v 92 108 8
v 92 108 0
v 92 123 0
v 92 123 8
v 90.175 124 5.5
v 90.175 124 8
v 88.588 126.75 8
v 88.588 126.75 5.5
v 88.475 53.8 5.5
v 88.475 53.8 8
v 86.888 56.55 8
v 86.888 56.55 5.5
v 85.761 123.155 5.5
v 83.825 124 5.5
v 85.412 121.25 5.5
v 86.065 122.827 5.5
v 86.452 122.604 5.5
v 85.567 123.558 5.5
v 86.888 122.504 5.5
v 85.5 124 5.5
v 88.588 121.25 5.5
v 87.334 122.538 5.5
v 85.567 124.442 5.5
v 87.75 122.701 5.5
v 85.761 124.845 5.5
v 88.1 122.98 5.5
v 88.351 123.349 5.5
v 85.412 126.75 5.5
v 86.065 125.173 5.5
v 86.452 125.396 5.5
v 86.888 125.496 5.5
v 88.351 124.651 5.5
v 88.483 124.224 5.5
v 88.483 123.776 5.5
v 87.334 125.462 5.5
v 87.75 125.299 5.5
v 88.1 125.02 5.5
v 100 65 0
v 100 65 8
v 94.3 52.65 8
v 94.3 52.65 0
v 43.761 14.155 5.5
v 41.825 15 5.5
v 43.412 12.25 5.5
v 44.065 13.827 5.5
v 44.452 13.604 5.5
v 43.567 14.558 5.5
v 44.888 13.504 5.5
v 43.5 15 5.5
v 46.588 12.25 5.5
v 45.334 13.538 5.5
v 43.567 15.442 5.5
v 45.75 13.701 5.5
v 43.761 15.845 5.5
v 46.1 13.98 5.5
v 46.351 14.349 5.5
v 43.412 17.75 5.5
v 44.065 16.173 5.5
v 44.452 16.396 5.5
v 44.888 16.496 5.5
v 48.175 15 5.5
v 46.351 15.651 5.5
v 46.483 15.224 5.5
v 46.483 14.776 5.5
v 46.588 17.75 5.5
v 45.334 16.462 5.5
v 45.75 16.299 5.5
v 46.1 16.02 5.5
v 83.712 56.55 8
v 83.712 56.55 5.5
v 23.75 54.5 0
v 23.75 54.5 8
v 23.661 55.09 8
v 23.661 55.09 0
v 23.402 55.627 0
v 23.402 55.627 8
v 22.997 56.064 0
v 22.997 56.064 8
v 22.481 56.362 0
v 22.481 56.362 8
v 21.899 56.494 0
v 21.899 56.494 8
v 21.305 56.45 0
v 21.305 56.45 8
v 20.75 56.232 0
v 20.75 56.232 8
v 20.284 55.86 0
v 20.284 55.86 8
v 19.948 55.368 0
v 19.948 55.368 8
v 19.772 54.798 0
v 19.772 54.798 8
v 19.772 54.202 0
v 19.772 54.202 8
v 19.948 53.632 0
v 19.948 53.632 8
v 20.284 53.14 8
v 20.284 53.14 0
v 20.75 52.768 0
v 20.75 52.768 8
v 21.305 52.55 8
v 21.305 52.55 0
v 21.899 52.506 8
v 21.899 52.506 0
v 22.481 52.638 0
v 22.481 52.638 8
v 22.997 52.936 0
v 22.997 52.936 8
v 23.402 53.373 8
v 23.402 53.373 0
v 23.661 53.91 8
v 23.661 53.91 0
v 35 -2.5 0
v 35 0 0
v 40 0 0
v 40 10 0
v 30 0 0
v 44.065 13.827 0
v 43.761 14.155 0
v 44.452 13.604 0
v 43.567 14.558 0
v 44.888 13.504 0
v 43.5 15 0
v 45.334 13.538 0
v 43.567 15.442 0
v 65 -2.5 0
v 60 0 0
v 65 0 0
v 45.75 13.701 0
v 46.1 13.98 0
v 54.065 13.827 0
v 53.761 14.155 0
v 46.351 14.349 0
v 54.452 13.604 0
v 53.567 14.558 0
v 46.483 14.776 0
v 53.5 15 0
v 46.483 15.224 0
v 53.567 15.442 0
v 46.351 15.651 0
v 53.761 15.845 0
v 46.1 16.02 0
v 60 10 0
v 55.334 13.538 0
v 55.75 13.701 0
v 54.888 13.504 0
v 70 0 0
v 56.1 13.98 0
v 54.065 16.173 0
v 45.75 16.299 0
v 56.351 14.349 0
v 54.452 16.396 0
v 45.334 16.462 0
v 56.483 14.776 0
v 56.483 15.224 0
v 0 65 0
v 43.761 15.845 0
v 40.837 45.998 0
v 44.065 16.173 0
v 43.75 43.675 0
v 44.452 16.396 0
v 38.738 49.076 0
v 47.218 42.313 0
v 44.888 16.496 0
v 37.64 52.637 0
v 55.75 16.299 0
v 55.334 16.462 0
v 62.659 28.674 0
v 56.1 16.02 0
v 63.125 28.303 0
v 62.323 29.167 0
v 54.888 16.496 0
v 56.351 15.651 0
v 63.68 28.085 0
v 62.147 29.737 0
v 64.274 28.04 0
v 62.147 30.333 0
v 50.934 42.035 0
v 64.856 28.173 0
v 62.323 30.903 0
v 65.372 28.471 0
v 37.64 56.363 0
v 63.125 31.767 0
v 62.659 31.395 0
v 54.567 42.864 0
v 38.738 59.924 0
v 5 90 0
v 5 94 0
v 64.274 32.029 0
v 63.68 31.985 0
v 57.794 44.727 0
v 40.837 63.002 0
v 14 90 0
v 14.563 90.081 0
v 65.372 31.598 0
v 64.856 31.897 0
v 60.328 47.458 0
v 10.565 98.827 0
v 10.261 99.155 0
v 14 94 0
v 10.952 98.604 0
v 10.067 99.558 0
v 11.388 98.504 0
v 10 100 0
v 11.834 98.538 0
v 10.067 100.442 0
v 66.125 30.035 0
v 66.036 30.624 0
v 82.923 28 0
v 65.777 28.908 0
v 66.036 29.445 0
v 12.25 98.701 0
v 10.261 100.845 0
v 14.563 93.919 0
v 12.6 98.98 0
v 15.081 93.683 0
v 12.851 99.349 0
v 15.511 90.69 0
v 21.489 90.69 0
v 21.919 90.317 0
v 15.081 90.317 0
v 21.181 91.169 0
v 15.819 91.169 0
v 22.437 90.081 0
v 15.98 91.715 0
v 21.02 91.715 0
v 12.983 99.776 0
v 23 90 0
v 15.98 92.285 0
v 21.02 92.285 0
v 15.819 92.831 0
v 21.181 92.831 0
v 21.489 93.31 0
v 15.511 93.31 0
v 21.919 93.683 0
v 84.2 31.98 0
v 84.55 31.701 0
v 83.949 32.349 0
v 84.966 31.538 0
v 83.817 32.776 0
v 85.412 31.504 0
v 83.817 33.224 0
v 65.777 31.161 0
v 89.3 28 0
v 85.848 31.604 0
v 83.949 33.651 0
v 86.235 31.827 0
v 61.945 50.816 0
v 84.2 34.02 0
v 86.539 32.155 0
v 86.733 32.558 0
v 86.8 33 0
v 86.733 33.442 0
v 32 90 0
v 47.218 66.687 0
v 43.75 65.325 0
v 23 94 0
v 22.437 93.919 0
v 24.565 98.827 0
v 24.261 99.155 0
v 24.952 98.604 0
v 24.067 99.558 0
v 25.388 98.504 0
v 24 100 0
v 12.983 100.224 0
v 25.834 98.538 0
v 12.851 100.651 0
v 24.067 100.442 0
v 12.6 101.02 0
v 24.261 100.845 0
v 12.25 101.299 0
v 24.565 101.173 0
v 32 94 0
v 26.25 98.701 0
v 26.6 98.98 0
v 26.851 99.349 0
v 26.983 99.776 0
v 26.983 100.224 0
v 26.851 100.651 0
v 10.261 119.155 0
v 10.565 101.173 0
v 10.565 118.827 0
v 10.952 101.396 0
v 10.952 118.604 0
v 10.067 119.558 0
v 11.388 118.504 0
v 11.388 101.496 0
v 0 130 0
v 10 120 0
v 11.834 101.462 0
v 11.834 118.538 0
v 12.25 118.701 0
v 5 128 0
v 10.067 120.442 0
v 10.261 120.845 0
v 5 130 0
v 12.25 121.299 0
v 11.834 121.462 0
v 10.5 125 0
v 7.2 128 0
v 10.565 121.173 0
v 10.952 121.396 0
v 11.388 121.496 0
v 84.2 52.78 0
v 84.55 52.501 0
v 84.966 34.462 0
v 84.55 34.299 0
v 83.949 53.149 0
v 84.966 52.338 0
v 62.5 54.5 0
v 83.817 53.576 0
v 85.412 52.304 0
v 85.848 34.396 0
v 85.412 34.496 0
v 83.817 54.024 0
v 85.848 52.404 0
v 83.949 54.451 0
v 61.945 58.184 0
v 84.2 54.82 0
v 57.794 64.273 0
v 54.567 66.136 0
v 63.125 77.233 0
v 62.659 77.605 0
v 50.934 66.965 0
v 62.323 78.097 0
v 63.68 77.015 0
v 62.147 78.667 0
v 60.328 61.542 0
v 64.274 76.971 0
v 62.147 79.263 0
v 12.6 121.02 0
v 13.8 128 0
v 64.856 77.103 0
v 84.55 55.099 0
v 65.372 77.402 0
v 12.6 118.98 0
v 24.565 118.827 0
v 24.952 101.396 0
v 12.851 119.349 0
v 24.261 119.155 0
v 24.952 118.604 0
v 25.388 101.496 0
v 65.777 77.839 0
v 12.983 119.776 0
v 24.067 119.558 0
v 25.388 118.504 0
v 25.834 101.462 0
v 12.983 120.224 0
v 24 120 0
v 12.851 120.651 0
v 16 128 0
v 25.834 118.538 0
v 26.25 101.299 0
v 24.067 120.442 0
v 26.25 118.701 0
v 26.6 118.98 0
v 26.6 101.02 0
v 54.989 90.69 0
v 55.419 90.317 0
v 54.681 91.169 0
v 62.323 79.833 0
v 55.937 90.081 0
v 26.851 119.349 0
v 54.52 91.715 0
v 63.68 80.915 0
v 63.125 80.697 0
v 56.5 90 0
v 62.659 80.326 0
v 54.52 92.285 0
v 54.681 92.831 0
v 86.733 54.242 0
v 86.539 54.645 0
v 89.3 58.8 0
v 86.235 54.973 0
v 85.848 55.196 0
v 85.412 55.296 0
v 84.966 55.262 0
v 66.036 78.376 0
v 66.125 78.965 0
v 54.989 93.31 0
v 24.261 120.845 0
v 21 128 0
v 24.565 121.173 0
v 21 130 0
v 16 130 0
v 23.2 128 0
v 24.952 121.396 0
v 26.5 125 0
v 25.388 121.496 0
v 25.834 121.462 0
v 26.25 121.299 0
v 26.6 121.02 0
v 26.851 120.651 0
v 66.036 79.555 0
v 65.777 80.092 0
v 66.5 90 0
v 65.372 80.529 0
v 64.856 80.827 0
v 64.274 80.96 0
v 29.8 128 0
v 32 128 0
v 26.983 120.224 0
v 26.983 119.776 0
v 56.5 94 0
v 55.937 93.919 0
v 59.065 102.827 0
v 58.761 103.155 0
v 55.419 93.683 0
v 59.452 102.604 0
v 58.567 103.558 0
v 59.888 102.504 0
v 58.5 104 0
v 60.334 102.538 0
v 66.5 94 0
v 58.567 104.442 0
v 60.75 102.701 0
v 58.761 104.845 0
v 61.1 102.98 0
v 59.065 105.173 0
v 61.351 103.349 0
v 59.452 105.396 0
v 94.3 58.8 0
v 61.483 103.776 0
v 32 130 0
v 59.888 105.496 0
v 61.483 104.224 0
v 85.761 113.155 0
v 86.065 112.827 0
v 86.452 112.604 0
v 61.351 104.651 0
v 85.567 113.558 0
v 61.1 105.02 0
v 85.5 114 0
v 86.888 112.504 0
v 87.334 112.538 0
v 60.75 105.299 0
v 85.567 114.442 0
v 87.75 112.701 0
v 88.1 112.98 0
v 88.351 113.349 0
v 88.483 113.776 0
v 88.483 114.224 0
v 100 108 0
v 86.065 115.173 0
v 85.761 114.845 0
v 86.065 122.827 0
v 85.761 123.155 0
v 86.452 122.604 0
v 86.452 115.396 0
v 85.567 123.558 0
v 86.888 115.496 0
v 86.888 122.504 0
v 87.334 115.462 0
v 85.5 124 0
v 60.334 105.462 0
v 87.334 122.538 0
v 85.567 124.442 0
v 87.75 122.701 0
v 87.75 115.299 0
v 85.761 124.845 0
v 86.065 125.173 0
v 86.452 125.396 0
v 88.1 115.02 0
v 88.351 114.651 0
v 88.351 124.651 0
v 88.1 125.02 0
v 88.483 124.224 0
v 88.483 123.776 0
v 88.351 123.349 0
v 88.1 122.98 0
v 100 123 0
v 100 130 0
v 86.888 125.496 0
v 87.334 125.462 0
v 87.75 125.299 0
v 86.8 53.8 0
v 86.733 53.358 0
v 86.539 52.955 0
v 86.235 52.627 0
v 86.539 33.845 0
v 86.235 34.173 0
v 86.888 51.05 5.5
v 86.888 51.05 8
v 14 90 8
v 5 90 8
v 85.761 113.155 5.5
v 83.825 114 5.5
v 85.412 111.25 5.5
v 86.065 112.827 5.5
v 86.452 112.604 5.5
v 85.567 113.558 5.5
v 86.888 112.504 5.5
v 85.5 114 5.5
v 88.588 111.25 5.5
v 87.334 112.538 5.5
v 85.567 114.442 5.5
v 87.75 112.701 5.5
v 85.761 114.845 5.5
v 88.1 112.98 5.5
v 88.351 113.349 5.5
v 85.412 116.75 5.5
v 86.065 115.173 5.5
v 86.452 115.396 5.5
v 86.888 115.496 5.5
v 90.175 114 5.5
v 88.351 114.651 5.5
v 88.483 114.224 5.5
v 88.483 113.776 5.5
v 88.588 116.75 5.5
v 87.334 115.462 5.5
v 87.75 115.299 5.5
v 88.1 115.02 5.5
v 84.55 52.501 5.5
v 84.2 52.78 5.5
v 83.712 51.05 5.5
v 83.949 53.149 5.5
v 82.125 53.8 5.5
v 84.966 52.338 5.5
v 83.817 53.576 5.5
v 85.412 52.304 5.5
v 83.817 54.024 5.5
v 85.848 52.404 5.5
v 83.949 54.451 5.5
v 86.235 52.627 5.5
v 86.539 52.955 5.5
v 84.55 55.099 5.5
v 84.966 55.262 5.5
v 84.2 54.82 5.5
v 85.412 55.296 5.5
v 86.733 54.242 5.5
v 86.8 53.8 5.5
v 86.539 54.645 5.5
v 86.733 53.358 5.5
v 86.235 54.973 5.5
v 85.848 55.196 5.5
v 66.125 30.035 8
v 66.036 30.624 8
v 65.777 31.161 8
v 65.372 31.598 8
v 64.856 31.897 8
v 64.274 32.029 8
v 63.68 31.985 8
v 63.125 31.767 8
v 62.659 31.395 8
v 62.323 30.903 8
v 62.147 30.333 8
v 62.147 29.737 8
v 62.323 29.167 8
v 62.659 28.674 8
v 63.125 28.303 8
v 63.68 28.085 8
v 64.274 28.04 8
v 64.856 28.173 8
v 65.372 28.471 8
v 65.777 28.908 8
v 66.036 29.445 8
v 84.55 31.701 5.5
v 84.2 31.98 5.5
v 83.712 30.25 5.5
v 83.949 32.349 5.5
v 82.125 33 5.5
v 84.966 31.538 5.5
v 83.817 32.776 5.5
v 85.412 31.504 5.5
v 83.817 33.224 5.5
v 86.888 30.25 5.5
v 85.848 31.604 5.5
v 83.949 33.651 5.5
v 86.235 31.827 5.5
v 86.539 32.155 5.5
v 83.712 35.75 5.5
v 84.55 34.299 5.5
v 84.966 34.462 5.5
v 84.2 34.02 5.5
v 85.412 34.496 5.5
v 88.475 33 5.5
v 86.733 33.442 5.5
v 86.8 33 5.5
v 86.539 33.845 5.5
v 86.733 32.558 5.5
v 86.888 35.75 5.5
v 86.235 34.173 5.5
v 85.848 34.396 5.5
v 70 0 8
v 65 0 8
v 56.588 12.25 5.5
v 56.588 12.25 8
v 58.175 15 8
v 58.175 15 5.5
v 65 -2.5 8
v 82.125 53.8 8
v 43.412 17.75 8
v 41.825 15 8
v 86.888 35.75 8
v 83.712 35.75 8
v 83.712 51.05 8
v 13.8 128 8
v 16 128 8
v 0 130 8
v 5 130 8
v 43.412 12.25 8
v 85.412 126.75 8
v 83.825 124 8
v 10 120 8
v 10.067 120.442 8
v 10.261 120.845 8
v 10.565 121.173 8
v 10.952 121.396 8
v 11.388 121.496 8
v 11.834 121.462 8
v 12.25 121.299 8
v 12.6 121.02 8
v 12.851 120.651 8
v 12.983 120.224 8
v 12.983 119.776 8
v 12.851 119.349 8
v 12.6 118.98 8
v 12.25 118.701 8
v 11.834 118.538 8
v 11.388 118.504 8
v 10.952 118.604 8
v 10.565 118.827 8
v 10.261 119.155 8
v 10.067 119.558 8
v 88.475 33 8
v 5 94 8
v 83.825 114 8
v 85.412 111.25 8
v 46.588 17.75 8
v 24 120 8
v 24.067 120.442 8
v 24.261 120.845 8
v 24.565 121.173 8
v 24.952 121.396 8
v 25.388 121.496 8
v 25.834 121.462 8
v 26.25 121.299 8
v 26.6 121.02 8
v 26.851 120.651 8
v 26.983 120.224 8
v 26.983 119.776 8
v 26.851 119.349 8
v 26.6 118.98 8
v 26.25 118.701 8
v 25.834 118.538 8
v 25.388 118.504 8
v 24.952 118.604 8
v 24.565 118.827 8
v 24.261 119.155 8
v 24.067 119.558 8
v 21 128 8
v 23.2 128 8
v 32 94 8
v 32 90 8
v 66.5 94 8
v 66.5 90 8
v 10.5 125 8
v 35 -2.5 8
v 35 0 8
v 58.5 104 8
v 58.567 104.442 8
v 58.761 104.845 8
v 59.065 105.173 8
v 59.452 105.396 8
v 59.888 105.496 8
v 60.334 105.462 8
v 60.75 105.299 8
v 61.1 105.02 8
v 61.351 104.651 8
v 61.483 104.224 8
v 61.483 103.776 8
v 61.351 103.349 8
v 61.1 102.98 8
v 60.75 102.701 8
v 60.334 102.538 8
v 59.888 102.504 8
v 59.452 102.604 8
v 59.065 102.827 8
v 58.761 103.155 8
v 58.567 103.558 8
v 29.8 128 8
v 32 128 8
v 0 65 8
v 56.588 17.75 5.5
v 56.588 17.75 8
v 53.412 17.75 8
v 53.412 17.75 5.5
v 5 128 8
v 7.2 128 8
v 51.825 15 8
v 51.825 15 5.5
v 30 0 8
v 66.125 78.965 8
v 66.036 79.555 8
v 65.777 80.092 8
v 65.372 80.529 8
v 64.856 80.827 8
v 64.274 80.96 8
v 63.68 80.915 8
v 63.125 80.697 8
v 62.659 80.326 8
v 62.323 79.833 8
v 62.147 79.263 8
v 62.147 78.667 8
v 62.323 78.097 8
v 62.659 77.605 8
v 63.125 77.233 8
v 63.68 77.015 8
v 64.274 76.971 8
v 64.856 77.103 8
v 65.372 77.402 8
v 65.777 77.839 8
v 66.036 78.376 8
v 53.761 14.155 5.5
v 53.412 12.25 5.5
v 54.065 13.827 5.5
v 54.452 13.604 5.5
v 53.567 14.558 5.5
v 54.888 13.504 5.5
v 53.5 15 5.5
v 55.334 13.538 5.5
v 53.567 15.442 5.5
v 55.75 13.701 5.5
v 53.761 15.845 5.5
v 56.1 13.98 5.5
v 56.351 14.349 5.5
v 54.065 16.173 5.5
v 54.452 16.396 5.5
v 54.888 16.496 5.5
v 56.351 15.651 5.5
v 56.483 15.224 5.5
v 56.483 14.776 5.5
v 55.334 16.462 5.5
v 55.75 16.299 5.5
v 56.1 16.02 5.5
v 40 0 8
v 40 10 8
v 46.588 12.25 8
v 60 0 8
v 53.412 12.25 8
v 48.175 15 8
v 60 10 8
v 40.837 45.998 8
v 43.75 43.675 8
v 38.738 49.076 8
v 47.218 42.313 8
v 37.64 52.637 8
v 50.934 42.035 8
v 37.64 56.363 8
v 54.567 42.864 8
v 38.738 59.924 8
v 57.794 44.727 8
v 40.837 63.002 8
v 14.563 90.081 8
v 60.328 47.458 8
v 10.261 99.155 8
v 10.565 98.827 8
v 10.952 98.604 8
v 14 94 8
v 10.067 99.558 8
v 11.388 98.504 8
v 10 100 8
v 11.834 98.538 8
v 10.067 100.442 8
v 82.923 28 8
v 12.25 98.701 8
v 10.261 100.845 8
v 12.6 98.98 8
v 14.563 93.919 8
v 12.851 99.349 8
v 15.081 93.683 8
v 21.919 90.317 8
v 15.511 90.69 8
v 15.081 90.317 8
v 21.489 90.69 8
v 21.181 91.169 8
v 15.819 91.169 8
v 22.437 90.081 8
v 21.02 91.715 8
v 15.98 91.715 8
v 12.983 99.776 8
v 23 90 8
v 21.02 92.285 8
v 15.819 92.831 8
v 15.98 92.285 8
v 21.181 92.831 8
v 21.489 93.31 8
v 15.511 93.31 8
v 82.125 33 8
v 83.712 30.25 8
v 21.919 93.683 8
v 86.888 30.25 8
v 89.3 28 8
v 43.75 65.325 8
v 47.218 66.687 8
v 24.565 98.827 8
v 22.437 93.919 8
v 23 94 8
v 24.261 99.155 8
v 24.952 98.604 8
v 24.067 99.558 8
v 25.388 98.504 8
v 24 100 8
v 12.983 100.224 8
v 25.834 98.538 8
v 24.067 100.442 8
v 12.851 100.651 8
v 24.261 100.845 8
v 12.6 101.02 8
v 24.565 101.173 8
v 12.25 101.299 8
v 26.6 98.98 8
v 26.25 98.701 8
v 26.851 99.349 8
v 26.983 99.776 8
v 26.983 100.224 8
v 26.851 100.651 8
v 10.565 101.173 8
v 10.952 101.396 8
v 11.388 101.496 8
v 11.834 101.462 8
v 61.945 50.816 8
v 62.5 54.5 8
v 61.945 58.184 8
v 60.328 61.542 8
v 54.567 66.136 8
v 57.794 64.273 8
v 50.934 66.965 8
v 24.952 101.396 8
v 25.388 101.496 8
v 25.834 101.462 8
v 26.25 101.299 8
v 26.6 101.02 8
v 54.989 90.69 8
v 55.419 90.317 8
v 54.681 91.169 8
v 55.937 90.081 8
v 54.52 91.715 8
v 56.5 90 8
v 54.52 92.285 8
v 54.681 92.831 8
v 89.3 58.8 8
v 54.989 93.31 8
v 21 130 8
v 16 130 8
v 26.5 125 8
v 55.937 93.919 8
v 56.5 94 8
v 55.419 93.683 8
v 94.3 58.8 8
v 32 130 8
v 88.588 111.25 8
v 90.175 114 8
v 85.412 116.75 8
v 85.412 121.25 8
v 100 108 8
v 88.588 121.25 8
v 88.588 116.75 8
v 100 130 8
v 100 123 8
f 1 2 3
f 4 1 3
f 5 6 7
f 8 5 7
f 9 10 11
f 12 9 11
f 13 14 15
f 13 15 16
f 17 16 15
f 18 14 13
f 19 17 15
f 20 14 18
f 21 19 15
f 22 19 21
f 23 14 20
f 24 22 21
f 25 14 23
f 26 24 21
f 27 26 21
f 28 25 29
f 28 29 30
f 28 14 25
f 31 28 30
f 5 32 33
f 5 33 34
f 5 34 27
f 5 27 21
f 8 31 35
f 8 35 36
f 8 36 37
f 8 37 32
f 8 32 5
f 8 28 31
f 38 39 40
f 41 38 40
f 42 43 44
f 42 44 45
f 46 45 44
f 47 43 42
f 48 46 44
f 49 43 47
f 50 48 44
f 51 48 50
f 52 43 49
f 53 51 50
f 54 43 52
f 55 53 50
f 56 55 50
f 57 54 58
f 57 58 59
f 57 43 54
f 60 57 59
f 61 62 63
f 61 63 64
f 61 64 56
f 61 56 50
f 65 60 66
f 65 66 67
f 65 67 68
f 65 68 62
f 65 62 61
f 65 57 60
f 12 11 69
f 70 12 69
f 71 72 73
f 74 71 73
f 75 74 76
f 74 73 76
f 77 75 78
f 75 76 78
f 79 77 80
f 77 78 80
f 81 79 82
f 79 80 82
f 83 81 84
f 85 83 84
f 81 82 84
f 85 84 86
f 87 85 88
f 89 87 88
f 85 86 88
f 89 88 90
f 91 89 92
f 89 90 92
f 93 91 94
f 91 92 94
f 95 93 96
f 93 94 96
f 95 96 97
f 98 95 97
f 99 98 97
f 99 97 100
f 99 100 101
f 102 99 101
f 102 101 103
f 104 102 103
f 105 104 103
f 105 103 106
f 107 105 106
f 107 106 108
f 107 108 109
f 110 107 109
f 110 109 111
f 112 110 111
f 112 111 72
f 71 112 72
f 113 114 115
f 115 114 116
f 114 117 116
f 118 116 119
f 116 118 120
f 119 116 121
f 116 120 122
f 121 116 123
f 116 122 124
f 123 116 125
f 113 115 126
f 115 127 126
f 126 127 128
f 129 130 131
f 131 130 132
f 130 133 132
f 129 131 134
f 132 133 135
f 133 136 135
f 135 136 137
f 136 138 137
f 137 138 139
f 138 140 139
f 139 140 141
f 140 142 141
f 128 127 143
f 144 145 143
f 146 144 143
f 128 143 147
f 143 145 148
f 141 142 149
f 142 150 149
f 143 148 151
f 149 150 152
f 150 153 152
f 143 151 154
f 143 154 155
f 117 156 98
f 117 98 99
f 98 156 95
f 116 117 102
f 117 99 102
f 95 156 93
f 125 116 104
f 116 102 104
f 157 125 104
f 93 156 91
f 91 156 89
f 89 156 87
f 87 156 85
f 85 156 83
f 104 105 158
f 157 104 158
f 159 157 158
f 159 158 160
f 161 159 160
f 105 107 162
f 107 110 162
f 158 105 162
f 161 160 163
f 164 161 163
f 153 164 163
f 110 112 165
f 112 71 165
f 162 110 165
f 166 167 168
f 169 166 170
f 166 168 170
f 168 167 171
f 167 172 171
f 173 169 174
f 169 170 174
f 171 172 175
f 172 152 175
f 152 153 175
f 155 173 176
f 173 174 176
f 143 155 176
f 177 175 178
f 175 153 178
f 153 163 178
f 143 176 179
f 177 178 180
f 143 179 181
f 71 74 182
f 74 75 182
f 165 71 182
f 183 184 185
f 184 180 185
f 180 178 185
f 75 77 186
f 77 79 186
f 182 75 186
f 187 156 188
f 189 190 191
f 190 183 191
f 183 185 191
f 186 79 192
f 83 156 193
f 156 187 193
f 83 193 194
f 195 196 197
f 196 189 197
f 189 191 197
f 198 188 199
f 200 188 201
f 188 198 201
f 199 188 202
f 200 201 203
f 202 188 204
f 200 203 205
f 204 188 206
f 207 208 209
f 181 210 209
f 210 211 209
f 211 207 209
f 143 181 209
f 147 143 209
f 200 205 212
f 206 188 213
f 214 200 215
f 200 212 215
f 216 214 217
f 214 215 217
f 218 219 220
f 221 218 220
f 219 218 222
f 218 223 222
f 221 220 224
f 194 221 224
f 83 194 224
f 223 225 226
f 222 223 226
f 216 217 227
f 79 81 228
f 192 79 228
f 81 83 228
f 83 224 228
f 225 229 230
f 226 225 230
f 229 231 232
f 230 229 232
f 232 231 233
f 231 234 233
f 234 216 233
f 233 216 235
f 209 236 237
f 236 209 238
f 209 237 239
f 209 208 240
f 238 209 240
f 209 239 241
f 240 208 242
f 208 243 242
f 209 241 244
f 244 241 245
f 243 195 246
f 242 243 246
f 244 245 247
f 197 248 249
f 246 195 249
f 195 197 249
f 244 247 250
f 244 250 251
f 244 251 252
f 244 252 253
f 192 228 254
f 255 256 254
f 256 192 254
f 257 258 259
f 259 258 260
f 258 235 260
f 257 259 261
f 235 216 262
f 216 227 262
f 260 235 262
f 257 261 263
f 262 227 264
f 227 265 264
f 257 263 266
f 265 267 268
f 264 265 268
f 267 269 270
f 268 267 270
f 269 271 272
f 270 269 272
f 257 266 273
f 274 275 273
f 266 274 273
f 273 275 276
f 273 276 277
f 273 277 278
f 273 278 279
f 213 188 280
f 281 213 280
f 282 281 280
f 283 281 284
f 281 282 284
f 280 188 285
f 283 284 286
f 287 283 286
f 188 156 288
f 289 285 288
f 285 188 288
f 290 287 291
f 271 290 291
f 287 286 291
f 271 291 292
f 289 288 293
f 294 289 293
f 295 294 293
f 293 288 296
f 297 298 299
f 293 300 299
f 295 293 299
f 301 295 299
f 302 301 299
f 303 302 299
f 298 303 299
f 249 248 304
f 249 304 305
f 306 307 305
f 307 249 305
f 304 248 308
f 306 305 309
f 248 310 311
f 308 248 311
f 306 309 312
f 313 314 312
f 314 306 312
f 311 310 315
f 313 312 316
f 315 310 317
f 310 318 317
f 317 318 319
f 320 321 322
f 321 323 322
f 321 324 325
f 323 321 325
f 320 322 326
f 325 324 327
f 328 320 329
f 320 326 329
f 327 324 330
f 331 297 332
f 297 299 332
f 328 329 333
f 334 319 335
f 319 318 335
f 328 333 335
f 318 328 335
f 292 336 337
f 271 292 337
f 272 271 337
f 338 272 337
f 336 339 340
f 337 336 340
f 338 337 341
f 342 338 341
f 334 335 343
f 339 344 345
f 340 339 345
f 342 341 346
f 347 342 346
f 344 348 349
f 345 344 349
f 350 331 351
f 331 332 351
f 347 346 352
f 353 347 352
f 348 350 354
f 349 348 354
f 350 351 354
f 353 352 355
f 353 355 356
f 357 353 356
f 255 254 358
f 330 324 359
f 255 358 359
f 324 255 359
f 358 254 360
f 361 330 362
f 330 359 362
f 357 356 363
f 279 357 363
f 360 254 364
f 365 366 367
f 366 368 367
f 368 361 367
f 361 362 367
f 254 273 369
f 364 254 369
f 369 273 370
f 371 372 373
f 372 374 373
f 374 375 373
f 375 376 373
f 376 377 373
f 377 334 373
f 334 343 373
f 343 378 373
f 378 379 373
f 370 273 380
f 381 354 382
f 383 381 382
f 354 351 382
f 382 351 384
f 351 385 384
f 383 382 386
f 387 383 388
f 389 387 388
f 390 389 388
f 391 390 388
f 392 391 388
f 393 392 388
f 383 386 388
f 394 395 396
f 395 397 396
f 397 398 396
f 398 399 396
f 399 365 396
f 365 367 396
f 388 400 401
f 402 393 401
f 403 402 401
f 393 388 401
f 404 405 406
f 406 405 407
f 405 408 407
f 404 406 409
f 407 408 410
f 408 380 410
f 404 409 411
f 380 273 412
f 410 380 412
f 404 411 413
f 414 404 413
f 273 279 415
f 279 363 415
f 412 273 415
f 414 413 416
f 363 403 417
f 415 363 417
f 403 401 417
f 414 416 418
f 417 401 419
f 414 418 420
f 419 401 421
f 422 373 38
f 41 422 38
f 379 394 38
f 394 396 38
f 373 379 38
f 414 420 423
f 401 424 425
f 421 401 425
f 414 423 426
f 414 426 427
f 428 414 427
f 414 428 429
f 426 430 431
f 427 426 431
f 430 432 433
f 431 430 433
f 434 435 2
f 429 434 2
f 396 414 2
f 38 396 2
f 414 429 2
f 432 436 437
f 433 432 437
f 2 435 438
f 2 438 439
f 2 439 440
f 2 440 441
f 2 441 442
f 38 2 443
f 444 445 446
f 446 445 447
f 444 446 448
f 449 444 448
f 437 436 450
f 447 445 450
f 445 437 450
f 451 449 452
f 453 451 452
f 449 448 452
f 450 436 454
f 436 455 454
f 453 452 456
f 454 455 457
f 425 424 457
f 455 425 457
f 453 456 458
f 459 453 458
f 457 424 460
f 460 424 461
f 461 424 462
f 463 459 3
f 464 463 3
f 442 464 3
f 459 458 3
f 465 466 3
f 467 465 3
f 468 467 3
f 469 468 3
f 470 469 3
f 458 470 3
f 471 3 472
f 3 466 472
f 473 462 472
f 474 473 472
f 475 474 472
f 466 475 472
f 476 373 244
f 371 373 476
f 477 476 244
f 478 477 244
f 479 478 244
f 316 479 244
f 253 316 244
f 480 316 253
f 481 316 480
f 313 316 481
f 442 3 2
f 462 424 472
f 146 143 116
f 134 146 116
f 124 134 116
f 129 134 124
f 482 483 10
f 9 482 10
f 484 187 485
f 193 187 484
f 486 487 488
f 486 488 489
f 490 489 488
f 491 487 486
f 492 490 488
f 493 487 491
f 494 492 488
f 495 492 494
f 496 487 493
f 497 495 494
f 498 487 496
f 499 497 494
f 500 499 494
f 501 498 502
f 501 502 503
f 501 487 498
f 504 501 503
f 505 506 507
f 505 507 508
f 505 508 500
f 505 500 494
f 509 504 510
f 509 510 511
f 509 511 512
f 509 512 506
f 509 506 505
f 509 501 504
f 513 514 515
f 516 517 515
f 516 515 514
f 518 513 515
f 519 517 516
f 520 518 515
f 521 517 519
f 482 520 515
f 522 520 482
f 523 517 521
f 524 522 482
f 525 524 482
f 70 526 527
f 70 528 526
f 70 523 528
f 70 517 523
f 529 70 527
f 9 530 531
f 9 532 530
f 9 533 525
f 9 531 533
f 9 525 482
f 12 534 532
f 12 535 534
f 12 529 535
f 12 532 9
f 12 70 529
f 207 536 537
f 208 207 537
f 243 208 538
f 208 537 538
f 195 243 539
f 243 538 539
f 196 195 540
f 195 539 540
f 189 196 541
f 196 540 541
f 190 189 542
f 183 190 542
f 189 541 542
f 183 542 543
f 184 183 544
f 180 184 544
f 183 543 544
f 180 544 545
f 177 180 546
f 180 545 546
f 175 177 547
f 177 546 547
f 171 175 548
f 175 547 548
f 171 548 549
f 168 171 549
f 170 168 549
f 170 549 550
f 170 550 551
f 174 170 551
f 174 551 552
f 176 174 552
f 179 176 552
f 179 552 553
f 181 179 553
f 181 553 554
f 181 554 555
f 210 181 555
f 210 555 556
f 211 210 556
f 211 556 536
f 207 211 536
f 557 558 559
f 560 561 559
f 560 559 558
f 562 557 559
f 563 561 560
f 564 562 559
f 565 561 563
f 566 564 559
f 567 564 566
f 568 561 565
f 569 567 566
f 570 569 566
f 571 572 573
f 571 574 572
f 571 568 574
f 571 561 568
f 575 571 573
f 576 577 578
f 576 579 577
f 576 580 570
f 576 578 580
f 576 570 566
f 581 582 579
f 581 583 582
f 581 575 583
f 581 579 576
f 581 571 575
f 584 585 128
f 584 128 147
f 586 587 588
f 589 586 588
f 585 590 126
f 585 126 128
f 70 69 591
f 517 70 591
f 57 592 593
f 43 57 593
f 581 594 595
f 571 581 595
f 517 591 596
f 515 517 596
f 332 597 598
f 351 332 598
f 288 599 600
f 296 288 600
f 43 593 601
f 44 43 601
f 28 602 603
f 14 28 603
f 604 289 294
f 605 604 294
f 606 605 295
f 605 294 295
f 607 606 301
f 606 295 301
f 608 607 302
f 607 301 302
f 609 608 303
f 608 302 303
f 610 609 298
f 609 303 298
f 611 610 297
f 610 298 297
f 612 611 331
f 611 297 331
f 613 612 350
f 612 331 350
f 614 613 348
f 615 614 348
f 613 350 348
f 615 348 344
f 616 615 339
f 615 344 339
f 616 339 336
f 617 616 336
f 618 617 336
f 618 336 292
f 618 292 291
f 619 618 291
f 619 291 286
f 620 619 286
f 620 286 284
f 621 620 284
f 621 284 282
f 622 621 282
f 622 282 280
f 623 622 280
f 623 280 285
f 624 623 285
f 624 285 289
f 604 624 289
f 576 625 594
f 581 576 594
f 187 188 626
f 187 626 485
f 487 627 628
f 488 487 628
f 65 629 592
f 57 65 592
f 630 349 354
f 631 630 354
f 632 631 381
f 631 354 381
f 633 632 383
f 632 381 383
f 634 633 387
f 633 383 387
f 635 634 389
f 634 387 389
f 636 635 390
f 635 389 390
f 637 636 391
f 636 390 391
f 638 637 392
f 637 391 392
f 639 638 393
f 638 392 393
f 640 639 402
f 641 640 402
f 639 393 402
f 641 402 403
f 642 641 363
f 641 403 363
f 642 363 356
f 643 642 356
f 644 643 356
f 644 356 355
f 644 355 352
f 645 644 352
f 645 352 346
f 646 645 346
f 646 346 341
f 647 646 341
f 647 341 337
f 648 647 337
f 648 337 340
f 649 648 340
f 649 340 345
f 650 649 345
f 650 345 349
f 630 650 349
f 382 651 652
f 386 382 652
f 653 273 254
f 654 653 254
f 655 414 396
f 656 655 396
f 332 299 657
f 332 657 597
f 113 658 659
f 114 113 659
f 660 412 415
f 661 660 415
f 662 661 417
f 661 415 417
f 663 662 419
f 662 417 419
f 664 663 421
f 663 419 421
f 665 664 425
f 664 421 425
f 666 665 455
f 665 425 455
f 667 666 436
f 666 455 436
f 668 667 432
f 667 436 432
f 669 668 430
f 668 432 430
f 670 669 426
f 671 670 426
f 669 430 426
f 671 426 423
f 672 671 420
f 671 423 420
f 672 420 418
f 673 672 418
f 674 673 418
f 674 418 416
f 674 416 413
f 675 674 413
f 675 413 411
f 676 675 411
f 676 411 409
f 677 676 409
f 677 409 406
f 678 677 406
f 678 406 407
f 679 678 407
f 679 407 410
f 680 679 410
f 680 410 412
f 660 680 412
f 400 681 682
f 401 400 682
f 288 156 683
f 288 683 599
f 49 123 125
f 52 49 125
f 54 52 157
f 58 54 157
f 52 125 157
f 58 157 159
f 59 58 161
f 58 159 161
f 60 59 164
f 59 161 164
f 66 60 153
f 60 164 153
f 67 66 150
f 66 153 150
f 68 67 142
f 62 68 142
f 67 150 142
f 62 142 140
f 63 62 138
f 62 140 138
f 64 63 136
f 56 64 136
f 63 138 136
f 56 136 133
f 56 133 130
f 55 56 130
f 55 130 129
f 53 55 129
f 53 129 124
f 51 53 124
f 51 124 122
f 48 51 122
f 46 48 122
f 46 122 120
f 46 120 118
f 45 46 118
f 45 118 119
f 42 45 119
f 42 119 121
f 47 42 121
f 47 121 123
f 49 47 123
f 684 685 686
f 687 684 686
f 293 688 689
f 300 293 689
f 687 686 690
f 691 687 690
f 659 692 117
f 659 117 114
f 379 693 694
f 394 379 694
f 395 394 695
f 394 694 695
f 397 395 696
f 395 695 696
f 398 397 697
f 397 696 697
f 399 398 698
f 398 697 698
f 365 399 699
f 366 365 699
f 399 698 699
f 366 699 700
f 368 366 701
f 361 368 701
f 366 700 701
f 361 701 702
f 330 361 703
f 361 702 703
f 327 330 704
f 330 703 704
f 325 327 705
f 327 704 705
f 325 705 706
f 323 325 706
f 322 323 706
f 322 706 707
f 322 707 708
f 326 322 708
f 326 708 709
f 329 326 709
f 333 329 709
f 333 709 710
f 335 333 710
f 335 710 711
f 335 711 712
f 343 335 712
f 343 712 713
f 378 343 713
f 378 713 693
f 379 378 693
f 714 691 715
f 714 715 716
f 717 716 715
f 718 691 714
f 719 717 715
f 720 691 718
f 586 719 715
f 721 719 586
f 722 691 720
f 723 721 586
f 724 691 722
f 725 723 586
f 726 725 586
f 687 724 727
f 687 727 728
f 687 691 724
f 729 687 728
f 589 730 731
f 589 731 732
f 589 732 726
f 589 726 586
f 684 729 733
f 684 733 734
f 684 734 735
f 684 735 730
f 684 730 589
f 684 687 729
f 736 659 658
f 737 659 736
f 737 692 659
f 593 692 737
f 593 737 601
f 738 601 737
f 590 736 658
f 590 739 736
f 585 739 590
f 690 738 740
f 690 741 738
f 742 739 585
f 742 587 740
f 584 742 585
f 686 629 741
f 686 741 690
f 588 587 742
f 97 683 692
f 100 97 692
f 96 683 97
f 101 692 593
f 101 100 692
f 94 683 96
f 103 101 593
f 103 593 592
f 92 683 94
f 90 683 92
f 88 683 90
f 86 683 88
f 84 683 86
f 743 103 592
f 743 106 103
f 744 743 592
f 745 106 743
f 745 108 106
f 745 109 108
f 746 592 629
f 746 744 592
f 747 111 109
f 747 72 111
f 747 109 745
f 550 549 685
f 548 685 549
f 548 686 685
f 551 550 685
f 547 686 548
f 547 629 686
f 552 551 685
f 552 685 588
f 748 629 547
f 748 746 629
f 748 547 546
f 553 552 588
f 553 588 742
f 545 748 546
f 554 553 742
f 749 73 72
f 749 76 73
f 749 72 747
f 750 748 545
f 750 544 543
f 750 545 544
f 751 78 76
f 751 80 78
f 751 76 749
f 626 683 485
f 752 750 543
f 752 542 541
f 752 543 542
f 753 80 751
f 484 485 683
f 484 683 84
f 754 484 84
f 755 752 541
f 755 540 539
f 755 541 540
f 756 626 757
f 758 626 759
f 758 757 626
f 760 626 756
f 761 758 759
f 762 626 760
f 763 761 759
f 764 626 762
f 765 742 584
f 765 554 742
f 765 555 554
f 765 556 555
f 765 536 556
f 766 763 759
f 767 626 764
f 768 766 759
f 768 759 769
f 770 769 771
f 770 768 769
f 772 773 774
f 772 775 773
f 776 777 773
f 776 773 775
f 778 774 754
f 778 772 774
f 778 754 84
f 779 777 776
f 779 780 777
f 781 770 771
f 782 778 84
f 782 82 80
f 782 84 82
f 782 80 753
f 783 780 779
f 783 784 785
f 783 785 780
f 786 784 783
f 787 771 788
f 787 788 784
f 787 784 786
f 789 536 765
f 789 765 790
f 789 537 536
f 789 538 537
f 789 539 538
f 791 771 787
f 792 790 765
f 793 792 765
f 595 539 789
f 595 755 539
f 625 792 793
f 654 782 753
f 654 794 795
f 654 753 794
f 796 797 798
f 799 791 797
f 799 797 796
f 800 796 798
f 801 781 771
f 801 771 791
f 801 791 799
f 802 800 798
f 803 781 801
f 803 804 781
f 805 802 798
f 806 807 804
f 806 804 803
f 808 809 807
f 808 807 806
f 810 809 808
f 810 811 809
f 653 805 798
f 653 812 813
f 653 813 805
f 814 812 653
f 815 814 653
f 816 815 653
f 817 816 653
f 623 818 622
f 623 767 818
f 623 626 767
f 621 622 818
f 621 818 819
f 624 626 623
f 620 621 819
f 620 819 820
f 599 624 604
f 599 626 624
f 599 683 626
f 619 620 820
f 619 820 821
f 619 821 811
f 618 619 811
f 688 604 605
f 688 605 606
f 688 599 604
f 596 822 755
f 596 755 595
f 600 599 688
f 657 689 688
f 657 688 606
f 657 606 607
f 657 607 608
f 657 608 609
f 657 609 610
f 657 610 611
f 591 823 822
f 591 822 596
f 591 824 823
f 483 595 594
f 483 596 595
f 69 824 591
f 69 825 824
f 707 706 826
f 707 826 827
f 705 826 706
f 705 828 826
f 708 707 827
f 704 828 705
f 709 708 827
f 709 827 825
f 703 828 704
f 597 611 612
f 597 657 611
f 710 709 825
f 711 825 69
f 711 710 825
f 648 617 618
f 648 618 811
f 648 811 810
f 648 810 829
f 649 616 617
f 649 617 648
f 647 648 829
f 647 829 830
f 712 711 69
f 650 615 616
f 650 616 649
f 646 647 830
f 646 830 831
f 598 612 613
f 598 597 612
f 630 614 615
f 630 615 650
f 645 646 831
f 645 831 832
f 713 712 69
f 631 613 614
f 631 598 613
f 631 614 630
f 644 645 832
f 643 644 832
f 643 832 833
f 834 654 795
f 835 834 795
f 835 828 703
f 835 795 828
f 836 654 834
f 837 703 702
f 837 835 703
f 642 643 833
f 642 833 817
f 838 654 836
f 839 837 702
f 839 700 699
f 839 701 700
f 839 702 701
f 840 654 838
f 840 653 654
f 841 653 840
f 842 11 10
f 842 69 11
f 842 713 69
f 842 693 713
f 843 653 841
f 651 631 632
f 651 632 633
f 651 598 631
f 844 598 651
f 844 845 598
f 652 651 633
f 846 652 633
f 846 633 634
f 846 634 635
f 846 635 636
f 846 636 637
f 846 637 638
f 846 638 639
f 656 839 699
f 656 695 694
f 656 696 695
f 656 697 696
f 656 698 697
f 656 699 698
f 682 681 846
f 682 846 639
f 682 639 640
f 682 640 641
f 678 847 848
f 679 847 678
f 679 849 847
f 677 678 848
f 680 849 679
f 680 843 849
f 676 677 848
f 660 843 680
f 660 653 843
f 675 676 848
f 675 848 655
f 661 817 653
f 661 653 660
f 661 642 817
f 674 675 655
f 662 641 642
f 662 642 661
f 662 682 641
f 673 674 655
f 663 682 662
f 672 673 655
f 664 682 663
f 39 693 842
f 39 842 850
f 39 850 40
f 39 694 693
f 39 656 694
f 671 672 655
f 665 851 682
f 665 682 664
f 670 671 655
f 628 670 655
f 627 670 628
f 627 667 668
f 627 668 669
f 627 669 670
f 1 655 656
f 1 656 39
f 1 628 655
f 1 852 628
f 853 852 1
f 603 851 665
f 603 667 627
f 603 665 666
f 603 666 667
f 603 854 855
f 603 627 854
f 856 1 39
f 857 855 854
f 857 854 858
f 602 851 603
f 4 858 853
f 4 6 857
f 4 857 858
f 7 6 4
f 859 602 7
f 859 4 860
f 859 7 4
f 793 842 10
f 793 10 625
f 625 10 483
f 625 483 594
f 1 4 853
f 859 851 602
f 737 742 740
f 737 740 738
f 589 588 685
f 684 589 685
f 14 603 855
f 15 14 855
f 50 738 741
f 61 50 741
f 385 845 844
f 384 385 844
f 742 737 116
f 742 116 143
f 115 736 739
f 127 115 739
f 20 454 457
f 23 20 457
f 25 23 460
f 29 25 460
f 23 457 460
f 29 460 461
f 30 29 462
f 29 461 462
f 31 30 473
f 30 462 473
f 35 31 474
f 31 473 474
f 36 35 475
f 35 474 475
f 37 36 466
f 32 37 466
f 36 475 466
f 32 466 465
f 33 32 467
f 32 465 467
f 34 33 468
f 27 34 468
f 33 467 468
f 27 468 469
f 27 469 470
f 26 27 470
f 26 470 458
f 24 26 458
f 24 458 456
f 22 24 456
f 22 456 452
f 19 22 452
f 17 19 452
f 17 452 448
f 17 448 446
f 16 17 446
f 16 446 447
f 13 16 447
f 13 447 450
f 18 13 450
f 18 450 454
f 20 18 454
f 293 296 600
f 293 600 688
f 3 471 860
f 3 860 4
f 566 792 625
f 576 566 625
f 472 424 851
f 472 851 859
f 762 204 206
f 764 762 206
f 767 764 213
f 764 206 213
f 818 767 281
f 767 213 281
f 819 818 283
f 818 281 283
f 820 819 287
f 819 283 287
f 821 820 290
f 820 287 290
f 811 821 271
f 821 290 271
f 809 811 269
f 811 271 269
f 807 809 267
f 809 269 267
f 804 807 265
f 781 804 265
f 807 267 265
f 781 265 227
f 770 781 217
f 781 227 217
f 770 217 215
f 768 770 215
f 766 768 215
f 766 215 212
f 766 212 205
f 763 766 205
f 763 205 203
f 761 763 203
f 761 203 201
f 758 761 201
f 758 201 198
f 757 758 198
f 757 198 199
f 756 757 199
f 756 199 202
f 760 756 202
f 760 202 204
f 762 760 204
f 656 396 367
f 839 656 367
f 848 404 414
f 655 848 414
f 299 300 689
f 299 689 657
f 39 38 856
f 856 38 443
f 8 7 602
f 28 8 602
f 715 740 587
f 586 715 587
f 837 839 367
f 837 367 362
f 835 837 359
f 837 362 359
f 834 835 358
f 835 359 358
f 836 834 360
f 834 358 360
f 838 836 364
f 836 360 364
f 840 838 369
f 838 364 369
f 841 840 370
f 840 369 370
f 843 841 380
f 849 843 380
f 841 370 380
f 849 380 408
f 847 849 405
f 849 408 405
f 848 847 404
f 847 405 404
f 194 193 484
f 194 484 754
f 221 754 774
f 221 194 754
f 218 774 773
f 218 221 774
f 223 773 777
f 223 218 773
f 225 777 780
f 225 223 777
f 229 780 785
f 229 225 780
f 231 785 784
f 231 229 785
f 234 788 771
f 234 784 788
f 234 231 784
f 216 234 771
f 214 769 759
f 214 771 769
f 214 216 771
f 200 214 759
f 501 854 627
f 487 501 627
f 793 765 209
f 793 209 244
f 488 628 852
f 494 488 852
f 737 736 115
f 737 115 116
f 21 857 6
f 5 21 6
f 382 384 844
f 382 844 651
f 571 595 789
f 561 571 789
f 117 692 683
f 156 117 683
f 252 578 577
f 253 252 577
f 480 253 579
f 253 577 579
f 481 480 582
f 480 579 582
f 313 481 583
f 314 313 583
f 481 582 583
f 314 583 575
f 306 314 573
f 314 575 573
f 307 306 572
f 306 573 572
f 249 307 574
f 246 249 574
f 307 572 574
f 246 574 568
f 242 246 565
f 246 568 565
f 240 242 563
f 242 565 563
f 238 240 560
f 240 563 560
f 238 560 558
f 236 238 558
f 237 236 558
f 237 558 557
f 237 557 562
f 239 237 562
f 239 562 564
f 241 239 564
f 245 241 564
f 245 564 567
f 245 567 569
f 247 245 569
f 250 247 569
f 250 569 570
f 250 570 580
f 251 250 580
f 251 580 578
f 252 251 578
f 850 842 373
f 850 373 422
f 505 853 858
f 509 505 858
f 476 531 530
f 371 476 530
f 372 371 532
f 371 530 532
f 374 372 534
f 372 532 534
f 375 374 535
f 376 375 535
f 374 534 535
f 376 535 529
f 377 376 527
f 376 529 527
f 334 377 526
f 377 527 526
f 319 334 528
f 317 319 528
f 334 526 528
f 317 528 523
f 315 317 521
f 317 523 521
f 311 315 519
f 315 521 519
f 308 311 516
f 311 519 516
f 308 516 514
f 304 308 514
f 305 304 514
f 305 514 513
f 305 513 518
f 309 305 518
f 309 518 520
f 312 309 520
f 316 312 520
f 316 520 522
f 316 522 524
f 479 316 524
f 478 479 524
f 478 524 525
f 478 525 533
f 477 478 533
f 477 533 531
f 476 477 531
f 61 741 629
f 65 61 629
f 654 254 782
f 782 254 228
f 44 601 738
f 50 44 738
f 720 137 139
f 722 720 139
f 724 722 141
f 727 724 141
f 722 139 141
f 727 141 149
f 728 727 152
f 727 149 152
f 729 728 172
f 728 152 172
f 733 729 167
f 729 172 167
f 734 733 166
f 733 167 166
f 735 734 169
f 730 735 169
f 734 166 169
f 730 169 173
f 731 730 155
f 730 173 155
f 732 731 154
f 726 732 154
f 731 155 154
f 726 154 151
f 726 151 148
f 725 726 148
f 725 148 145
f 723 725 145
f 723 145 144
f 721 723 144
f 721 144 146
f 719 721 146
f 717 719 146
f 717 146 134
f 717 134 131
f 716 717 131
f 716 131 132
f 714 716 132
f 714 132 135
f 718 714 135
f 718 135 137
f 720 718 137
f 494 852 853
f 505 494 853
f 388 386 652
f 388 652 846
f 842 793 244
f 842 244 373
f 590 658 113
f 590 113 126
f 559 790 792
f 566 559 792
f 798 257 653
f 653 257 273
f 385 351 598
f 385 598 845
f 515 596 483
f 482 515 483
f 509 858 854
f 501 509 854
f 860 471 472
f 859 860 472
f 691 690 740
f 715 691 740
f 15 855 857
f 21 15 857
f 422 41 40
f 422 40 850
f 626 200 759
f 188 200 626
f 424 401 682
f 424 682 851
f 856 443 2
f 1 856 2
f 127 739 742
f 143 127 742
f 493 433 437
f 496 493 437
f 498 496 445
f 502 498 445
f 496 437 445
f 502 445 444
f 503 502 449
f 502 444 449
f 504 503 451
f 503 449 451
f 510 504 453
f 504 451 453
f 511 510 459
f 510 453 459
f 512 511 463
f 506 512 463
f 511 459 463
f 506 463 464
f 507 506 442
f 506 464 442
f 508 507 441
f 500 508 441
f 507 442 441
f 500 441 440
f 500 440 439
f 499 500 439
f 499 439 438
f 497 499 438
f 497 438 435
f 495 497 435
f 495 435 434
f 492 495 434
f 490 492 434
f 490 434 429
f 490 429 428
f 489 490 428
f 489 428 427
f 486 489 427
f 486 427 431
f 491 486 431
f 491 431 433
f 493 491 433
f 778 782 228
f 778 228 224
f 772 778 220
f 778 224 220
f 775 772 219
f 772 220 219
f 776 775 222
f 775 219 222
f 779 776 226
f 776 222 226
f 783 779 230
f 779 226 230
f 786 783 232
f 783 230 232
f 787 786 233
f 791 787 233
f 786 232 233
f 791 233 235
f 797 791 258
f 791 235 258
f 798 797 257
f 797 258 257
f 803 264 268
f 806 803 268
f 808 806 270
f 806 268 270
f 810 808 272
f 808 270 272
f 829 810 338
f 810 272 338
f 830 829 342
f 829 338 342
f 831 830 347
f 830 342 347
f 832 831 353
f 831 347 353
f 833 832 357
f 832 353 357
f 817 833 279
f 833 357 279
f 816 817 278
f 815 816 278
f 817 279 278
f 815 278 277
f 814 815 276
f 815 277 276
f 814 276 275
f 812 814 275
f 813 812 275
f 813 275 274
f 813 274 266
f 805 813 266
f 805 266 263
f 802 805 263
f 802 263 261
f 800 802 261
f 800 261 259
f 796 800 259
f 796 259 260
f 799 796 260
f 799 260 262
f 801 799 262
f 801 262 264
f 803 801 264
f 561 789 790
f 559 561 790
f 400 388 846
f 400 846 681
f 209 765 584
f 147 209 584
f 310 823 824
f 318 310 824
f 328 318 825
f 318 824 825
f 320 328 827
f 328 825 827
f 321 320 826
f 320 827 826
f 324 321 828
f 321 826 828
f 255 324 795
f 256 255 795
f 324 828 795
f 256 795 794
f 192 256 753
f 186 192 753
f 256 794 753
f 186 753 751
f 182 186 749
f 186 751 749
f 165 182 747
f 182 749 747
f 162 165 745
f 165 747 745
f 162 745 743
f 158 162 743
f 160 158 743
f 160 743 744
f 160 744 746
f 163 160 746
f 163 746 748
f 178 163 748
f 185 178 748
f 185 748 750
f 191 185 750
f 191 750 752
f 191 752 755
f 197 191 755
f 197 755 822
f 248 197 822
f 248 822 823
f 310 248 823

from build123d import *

# Parameters (mm, degrees)
SKETCH_1_W          = 100
SKETCH_1_H          = 130
EXTRUDE_1_DEPTH     = 8
SKETCH_3_W          = 20
SKETCH_3_H          = 10
CUT_EXTRUDE_1_DEPTH = 8
SKETCH_4_R          = 1.5
SKETCH_4_W          = 8
SKETCH_4_H          = 15
CUT_EXTRUDE_2_DEPTH = 9
CUT_EXTRUDE_6_DEPTH = 2.5
SKETCH_10_R         = 12.5
SKETCH_10_W         = 5
SKETCH_10_H         = 30.8
CUT_EXTRUDE_7_DEPTH = 9
EXTRUDE_3_DEPTH     = 8
SKETCH_5_R          = 2
SKETCH_5_R_2        = 1.5
CUT_EXTRUDE_3_DEPTH = 9
SKETCH_11_W         = 30
SKETCH_11_H         = 2.5
EXTRUDE_2_DEPTH     = 8
CUT_EXTRUDE_8_DEPTH = 2.5


with BuildPart() as part:
    # 草图1 → 凸台-拉伸1 (new body)
    with BuildSketch(Plane.XY):
        with Locations((50, 65)):
            Rectangle(SKETCH_1_W, SKETCH_1_H)
    extrude(amount=EXTRUDE_1_DEPTH)

    # 草图3 → 切除-拉伸1 (cut)
    with BuildSketch(Plane.XY.offset(8)):
        with Locations((50, 5)):
            Rectangle(SKETCH_3_W, SKETCH_3_H)
        Polygon((0, 0), (30, 0), (0, 65), align=None)
        Polygon((100, 0), (100, 65), (70, 0), align=None)
    extrude(amount=-CUT_EXTRUDE_1_DEPTH, mode=Mode.SUBTRACT)

    # 草图4 → 切除-拉伸2 (cut, through all)
    with BuildSketch(Plane(origin=(0, 0, 0), x_dir=(-1, 0, 0), z_dir=(0, 0, -1))):
        with Locations((-87, 124)):
            Circle(SKETCH_4_R)
        with Locations((-25.5, 100)):
            Circle(SKETCH_4_R)
        with Locations((-11.5, 100)):
            Circle(SKETCH_4_R)
        with Locations((-11.5, 120)):
            Circle(SKETCH_4_R)
        with Locations((-25.5, 120)):
            Circle(SKETCH_4_R)
        with Locations((-60, 104)):
            Circle(SKETCH_4_R)
        with Locations((-45, 15)):
            Circle(SKETCH_4_R)
        with Locations((-55, 15)):
            Circle(SKETCH_4_R)
        with Locations((-87, 114)):
            Circle(SKETCH_4_R)
        with BuildLine():
            Line((-56.5, 94), (-66.5, 94))
            Line((-66.5, 94), (-66.5, 90))
            Line((-66.5, 90), (-56.5, 90))
            ThreePointArc((-56.5, 90), (-54.5, 92), (-56.5, 94))
        make_face()
        with Locations((-96, 115.5)):
            Rectangle(SKETCH_4_W, SKETCH_4_H)
        with BuildLine():
            Line((-32, 94), (-32, 90))
            Line((-32, 90), (-23, 90))
            ThreePointArc((-23, 90), (-21, 92), (-23, 94))
            Line((-23, 94), (-32, 94))
        make_face()
        with BuildLine():
            Line((-5, 94), (-5, 90))
            Line((-5, 90), (-14, 90))
            ThreePointArc((-14, 90), (-16, 92), (-14, 94))
            Line((-14, 94), (-5, 94))
        make_face()
        Polygon((-10.5, 125), (-13.8, 128), (-16, 128), (-16, 130), (-5, 130), (-5, 128), (-7.2, 128), align=None)
        Polygon((-26.5, 125), (-29.8, 128), (-32, 128), (-32, 130), (-21, 130), (-21, 128), (-23.2, 128), align=None)
    extrude(amount=-CUT_EXTRUDE_2_DEPTH, mode=Mode.SUBTRACT)

    # 草图9 → 切除-拉伸6 (cut)
    with BuildSketch(Plane.XY.offset(8)):
        Polygon((90.175426481, 124), (88.58771324, 126.75), (85.41228676, 126.75), (83.824573519, 124), (85.41228676, 121.25), (88.58771324, 121.25), align=None)
        Polygon((90.175426481, 114), (88.58771324, 116.75), (85.41228676, 116.75), (83.824573519, 114), (85.41228676, 111.25), (88.58771324, 111.25), align=None)
        Polygon((48.175426481, 15), (46.58771324, 17.75), (43.41228676, 17.75), (41.824573519, 15), (43.41228676, 12.25), (46.58771324, 12.25), align=None)
        Polygon((58.175426481, 15), (56.58771324, 17.75), (53.41228676, 17.75), (51.824573519, 15), (53.41228676, 12.25), (56.58771324, 12.25), align=None)
    extrude(amount=-CUT_EXTRUDE_6_DEPTH, mode=Mode.SUBTRACT)

    # 草图10 → 切除-拉伸7 (cut, through all)
    with BuildSketch(Plane.XY.offset(8)):
        with Locations((50, 54.5)):
            Circle(SKETCH_10_R)
        with Locations((91.8, 43.4)):
            Rectangle(SKETCH_10_W, SKETCH_10_H)
    extrude(amount=-CUT_EXTRUDE_7_DEPTH, mode=Mode.SUBTRACT)

    # 草图12 → 凸台-拉伸3 (add)
    with BuildSketch(Plane.XY.offset(8)):
        Polygon((89.3, 41.816666667), (82.923076923, 28), (89.3, 28), align=None)
    extrude(amount=-EXTRUDE_3_DEPTH)

    # 草图5 → 切除-拉伸3 (cut, through all)
    with BuildSketch(Plane.XY.offset(8)):
        with Locations((21.75, 54.5)):
            Circle(SKETCH_5_R)
        with Locations((64.125, 78.965217657)):
            Circle(SKETCH_5_R)
        with Locations((64.125, 30.034782343)):
            Circle(SKETCH_5_R)
        with Locations((85.3, 53.8)):
            Circle(SKETCH_5_R_2)
        with Locations((85.3, 33)):
            Circle(SKETCH_5_R_2)
    extrude(amount=-CUT_EXTRUDE_3_DEPTH, mode=Mode.SUBTRACT)

    # 草图11 → 凸台-拉伸2 (add)
    with BuildSketch(Plane.XY.offset(8)):
        with Locations((50, -1.25)):
            Rectangle(SKETCH_11_W, SKETCH_11_H)
    extrude(amount=-EXTRUDE_2_DEPTH)

    # 草图14 → 切除-拉伸8 (cut)
    with BuildSketch(Plane.XY.offset(8)):
        Polygon((88.475426481, 53.8), (86.88771324, 56.55), (83.71228676, 56.55), (82.124573519, 53.8), (83.71228676, 51.05), (86.88771324, 51.05), align=None)
        Polygon((88.475426481, 33), (86.88771324, 35.75), (83.71228676, 35.75), (82.124573519, 33), (83.71228676, 30.25), (86.88771324, 30.25), align=None)
    extrude(amount=-CUT_EXTRUDE_8_DEPTH, mode=Mode.SUBTRACT)


solid = part.part
